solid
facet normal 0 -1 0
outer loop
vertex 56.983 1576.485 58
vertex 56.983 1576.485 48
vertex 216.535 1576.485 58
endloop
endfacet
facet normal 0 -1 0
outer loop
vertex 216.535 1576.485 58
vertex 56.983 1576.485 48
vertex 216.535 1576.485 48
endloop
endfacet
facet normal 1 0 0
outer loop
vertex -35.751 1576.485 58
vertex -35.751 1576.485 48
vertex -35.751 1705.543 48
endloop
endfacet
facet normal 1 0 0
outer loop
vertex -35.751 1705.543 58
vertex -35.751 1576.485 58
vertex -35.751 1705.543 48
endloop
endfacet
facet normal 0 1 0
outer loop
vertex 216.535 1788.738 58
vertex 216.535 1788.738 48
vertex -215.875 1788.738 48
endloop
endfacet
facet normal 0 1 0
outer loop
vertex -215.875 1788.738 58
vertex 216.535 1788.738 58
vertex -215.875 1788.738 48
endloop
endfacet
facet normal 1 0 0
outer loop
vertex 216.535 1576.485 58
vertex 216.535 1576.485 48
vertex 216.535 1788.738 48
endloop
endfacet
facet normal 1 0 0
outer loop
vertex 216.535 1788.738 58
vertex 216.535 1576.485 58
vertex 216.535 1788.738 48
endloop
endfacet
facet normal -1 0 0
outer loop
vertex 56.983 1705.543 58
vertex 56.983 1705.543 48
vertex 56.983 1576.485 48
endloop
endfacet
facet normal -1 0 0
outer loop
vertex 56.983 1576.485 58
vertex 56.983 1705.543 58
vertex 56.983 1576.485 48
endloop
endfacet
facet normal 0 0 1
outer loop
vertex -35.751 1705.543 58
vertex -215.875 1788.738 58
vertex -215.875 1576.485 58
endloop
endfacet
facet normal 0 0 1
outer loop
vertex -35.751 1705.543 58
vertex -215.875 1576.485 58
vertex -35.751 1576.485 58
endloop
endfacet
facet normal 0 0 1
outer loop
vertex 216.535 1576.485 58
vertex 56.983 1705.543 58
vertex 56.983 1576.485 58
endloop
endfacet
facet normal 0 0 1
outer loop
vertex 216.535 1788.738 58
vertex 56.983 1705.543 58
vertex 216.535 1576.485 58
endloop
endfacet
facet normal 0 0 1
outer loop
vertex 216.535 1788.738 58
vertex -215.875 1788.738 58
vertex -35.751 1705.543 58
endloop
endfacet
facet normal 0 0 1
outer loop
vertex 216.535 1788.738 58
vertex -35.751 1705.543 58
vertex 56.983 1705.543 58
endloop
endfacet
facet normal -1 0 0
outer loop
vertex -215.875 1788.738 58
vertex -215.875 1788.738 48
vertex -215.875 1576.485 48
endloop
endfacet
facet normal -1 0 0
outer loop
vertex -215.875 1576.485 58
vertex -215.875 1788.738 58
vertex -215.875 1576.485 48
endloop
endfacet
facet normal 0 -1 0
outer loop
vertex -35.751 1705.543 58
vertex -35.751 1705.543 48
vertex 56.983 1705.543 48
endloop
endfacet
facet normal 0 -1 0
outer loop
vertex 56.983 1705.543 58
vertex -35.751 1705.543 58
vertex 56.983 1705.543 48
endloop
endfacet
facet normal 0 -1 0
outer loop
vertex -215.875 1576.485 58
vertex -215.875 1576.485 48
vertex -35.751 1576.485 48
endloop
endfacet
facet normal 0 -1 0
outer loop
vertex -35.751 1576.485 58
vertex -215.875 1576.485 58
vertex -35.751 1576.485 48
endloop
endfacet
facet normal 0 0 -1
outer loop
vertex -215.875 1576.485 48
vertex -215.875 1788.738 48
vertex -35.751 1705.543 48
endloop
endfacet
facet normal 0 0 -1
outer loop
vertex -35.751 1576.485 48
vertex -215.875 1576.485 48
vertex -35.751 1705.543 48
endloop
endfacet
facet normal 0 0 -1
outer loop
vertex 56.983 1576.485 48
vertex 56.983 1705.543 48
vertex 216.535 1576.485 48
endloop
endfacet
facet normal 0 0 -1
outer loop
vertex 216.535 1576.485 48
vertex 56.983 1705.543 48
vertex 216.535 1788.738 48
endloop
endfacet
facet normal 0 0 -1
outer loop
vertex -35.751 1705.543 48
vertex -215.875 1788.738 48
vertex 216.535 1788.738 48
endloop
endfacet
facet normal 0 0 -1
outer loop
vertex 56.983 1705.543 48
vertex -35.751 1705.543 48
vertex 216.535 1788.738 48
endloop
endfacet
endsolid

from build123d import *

# Parameters (mm, degrees)
BOSS_EXTRUDE1_START = 48
BOSS_EXTRUDE1_DEPTH = 10


with BuildPart() as part:
    # Sketch1 → Boss-Extrude1 (new body)
    with BuildSketch(Plane.XY.offset(BOSS_EXTRUDE1_START)):
        Polygon((-35.751247902, 1576.485487398), (-35.751247902, 1705.542913165), (56.982876999, 1705.542913165), (56.982876999, 1576.485487398), (216.535268781, 1576.485487398), (216.535268781, 1788.738422577), (-215.875298803, 1788.738422577), (-215.875298803, 1576.485487398), align=None)
    extrude(amount=BOSS_EXTRUDE1_DEPTH)


solid = part.part
